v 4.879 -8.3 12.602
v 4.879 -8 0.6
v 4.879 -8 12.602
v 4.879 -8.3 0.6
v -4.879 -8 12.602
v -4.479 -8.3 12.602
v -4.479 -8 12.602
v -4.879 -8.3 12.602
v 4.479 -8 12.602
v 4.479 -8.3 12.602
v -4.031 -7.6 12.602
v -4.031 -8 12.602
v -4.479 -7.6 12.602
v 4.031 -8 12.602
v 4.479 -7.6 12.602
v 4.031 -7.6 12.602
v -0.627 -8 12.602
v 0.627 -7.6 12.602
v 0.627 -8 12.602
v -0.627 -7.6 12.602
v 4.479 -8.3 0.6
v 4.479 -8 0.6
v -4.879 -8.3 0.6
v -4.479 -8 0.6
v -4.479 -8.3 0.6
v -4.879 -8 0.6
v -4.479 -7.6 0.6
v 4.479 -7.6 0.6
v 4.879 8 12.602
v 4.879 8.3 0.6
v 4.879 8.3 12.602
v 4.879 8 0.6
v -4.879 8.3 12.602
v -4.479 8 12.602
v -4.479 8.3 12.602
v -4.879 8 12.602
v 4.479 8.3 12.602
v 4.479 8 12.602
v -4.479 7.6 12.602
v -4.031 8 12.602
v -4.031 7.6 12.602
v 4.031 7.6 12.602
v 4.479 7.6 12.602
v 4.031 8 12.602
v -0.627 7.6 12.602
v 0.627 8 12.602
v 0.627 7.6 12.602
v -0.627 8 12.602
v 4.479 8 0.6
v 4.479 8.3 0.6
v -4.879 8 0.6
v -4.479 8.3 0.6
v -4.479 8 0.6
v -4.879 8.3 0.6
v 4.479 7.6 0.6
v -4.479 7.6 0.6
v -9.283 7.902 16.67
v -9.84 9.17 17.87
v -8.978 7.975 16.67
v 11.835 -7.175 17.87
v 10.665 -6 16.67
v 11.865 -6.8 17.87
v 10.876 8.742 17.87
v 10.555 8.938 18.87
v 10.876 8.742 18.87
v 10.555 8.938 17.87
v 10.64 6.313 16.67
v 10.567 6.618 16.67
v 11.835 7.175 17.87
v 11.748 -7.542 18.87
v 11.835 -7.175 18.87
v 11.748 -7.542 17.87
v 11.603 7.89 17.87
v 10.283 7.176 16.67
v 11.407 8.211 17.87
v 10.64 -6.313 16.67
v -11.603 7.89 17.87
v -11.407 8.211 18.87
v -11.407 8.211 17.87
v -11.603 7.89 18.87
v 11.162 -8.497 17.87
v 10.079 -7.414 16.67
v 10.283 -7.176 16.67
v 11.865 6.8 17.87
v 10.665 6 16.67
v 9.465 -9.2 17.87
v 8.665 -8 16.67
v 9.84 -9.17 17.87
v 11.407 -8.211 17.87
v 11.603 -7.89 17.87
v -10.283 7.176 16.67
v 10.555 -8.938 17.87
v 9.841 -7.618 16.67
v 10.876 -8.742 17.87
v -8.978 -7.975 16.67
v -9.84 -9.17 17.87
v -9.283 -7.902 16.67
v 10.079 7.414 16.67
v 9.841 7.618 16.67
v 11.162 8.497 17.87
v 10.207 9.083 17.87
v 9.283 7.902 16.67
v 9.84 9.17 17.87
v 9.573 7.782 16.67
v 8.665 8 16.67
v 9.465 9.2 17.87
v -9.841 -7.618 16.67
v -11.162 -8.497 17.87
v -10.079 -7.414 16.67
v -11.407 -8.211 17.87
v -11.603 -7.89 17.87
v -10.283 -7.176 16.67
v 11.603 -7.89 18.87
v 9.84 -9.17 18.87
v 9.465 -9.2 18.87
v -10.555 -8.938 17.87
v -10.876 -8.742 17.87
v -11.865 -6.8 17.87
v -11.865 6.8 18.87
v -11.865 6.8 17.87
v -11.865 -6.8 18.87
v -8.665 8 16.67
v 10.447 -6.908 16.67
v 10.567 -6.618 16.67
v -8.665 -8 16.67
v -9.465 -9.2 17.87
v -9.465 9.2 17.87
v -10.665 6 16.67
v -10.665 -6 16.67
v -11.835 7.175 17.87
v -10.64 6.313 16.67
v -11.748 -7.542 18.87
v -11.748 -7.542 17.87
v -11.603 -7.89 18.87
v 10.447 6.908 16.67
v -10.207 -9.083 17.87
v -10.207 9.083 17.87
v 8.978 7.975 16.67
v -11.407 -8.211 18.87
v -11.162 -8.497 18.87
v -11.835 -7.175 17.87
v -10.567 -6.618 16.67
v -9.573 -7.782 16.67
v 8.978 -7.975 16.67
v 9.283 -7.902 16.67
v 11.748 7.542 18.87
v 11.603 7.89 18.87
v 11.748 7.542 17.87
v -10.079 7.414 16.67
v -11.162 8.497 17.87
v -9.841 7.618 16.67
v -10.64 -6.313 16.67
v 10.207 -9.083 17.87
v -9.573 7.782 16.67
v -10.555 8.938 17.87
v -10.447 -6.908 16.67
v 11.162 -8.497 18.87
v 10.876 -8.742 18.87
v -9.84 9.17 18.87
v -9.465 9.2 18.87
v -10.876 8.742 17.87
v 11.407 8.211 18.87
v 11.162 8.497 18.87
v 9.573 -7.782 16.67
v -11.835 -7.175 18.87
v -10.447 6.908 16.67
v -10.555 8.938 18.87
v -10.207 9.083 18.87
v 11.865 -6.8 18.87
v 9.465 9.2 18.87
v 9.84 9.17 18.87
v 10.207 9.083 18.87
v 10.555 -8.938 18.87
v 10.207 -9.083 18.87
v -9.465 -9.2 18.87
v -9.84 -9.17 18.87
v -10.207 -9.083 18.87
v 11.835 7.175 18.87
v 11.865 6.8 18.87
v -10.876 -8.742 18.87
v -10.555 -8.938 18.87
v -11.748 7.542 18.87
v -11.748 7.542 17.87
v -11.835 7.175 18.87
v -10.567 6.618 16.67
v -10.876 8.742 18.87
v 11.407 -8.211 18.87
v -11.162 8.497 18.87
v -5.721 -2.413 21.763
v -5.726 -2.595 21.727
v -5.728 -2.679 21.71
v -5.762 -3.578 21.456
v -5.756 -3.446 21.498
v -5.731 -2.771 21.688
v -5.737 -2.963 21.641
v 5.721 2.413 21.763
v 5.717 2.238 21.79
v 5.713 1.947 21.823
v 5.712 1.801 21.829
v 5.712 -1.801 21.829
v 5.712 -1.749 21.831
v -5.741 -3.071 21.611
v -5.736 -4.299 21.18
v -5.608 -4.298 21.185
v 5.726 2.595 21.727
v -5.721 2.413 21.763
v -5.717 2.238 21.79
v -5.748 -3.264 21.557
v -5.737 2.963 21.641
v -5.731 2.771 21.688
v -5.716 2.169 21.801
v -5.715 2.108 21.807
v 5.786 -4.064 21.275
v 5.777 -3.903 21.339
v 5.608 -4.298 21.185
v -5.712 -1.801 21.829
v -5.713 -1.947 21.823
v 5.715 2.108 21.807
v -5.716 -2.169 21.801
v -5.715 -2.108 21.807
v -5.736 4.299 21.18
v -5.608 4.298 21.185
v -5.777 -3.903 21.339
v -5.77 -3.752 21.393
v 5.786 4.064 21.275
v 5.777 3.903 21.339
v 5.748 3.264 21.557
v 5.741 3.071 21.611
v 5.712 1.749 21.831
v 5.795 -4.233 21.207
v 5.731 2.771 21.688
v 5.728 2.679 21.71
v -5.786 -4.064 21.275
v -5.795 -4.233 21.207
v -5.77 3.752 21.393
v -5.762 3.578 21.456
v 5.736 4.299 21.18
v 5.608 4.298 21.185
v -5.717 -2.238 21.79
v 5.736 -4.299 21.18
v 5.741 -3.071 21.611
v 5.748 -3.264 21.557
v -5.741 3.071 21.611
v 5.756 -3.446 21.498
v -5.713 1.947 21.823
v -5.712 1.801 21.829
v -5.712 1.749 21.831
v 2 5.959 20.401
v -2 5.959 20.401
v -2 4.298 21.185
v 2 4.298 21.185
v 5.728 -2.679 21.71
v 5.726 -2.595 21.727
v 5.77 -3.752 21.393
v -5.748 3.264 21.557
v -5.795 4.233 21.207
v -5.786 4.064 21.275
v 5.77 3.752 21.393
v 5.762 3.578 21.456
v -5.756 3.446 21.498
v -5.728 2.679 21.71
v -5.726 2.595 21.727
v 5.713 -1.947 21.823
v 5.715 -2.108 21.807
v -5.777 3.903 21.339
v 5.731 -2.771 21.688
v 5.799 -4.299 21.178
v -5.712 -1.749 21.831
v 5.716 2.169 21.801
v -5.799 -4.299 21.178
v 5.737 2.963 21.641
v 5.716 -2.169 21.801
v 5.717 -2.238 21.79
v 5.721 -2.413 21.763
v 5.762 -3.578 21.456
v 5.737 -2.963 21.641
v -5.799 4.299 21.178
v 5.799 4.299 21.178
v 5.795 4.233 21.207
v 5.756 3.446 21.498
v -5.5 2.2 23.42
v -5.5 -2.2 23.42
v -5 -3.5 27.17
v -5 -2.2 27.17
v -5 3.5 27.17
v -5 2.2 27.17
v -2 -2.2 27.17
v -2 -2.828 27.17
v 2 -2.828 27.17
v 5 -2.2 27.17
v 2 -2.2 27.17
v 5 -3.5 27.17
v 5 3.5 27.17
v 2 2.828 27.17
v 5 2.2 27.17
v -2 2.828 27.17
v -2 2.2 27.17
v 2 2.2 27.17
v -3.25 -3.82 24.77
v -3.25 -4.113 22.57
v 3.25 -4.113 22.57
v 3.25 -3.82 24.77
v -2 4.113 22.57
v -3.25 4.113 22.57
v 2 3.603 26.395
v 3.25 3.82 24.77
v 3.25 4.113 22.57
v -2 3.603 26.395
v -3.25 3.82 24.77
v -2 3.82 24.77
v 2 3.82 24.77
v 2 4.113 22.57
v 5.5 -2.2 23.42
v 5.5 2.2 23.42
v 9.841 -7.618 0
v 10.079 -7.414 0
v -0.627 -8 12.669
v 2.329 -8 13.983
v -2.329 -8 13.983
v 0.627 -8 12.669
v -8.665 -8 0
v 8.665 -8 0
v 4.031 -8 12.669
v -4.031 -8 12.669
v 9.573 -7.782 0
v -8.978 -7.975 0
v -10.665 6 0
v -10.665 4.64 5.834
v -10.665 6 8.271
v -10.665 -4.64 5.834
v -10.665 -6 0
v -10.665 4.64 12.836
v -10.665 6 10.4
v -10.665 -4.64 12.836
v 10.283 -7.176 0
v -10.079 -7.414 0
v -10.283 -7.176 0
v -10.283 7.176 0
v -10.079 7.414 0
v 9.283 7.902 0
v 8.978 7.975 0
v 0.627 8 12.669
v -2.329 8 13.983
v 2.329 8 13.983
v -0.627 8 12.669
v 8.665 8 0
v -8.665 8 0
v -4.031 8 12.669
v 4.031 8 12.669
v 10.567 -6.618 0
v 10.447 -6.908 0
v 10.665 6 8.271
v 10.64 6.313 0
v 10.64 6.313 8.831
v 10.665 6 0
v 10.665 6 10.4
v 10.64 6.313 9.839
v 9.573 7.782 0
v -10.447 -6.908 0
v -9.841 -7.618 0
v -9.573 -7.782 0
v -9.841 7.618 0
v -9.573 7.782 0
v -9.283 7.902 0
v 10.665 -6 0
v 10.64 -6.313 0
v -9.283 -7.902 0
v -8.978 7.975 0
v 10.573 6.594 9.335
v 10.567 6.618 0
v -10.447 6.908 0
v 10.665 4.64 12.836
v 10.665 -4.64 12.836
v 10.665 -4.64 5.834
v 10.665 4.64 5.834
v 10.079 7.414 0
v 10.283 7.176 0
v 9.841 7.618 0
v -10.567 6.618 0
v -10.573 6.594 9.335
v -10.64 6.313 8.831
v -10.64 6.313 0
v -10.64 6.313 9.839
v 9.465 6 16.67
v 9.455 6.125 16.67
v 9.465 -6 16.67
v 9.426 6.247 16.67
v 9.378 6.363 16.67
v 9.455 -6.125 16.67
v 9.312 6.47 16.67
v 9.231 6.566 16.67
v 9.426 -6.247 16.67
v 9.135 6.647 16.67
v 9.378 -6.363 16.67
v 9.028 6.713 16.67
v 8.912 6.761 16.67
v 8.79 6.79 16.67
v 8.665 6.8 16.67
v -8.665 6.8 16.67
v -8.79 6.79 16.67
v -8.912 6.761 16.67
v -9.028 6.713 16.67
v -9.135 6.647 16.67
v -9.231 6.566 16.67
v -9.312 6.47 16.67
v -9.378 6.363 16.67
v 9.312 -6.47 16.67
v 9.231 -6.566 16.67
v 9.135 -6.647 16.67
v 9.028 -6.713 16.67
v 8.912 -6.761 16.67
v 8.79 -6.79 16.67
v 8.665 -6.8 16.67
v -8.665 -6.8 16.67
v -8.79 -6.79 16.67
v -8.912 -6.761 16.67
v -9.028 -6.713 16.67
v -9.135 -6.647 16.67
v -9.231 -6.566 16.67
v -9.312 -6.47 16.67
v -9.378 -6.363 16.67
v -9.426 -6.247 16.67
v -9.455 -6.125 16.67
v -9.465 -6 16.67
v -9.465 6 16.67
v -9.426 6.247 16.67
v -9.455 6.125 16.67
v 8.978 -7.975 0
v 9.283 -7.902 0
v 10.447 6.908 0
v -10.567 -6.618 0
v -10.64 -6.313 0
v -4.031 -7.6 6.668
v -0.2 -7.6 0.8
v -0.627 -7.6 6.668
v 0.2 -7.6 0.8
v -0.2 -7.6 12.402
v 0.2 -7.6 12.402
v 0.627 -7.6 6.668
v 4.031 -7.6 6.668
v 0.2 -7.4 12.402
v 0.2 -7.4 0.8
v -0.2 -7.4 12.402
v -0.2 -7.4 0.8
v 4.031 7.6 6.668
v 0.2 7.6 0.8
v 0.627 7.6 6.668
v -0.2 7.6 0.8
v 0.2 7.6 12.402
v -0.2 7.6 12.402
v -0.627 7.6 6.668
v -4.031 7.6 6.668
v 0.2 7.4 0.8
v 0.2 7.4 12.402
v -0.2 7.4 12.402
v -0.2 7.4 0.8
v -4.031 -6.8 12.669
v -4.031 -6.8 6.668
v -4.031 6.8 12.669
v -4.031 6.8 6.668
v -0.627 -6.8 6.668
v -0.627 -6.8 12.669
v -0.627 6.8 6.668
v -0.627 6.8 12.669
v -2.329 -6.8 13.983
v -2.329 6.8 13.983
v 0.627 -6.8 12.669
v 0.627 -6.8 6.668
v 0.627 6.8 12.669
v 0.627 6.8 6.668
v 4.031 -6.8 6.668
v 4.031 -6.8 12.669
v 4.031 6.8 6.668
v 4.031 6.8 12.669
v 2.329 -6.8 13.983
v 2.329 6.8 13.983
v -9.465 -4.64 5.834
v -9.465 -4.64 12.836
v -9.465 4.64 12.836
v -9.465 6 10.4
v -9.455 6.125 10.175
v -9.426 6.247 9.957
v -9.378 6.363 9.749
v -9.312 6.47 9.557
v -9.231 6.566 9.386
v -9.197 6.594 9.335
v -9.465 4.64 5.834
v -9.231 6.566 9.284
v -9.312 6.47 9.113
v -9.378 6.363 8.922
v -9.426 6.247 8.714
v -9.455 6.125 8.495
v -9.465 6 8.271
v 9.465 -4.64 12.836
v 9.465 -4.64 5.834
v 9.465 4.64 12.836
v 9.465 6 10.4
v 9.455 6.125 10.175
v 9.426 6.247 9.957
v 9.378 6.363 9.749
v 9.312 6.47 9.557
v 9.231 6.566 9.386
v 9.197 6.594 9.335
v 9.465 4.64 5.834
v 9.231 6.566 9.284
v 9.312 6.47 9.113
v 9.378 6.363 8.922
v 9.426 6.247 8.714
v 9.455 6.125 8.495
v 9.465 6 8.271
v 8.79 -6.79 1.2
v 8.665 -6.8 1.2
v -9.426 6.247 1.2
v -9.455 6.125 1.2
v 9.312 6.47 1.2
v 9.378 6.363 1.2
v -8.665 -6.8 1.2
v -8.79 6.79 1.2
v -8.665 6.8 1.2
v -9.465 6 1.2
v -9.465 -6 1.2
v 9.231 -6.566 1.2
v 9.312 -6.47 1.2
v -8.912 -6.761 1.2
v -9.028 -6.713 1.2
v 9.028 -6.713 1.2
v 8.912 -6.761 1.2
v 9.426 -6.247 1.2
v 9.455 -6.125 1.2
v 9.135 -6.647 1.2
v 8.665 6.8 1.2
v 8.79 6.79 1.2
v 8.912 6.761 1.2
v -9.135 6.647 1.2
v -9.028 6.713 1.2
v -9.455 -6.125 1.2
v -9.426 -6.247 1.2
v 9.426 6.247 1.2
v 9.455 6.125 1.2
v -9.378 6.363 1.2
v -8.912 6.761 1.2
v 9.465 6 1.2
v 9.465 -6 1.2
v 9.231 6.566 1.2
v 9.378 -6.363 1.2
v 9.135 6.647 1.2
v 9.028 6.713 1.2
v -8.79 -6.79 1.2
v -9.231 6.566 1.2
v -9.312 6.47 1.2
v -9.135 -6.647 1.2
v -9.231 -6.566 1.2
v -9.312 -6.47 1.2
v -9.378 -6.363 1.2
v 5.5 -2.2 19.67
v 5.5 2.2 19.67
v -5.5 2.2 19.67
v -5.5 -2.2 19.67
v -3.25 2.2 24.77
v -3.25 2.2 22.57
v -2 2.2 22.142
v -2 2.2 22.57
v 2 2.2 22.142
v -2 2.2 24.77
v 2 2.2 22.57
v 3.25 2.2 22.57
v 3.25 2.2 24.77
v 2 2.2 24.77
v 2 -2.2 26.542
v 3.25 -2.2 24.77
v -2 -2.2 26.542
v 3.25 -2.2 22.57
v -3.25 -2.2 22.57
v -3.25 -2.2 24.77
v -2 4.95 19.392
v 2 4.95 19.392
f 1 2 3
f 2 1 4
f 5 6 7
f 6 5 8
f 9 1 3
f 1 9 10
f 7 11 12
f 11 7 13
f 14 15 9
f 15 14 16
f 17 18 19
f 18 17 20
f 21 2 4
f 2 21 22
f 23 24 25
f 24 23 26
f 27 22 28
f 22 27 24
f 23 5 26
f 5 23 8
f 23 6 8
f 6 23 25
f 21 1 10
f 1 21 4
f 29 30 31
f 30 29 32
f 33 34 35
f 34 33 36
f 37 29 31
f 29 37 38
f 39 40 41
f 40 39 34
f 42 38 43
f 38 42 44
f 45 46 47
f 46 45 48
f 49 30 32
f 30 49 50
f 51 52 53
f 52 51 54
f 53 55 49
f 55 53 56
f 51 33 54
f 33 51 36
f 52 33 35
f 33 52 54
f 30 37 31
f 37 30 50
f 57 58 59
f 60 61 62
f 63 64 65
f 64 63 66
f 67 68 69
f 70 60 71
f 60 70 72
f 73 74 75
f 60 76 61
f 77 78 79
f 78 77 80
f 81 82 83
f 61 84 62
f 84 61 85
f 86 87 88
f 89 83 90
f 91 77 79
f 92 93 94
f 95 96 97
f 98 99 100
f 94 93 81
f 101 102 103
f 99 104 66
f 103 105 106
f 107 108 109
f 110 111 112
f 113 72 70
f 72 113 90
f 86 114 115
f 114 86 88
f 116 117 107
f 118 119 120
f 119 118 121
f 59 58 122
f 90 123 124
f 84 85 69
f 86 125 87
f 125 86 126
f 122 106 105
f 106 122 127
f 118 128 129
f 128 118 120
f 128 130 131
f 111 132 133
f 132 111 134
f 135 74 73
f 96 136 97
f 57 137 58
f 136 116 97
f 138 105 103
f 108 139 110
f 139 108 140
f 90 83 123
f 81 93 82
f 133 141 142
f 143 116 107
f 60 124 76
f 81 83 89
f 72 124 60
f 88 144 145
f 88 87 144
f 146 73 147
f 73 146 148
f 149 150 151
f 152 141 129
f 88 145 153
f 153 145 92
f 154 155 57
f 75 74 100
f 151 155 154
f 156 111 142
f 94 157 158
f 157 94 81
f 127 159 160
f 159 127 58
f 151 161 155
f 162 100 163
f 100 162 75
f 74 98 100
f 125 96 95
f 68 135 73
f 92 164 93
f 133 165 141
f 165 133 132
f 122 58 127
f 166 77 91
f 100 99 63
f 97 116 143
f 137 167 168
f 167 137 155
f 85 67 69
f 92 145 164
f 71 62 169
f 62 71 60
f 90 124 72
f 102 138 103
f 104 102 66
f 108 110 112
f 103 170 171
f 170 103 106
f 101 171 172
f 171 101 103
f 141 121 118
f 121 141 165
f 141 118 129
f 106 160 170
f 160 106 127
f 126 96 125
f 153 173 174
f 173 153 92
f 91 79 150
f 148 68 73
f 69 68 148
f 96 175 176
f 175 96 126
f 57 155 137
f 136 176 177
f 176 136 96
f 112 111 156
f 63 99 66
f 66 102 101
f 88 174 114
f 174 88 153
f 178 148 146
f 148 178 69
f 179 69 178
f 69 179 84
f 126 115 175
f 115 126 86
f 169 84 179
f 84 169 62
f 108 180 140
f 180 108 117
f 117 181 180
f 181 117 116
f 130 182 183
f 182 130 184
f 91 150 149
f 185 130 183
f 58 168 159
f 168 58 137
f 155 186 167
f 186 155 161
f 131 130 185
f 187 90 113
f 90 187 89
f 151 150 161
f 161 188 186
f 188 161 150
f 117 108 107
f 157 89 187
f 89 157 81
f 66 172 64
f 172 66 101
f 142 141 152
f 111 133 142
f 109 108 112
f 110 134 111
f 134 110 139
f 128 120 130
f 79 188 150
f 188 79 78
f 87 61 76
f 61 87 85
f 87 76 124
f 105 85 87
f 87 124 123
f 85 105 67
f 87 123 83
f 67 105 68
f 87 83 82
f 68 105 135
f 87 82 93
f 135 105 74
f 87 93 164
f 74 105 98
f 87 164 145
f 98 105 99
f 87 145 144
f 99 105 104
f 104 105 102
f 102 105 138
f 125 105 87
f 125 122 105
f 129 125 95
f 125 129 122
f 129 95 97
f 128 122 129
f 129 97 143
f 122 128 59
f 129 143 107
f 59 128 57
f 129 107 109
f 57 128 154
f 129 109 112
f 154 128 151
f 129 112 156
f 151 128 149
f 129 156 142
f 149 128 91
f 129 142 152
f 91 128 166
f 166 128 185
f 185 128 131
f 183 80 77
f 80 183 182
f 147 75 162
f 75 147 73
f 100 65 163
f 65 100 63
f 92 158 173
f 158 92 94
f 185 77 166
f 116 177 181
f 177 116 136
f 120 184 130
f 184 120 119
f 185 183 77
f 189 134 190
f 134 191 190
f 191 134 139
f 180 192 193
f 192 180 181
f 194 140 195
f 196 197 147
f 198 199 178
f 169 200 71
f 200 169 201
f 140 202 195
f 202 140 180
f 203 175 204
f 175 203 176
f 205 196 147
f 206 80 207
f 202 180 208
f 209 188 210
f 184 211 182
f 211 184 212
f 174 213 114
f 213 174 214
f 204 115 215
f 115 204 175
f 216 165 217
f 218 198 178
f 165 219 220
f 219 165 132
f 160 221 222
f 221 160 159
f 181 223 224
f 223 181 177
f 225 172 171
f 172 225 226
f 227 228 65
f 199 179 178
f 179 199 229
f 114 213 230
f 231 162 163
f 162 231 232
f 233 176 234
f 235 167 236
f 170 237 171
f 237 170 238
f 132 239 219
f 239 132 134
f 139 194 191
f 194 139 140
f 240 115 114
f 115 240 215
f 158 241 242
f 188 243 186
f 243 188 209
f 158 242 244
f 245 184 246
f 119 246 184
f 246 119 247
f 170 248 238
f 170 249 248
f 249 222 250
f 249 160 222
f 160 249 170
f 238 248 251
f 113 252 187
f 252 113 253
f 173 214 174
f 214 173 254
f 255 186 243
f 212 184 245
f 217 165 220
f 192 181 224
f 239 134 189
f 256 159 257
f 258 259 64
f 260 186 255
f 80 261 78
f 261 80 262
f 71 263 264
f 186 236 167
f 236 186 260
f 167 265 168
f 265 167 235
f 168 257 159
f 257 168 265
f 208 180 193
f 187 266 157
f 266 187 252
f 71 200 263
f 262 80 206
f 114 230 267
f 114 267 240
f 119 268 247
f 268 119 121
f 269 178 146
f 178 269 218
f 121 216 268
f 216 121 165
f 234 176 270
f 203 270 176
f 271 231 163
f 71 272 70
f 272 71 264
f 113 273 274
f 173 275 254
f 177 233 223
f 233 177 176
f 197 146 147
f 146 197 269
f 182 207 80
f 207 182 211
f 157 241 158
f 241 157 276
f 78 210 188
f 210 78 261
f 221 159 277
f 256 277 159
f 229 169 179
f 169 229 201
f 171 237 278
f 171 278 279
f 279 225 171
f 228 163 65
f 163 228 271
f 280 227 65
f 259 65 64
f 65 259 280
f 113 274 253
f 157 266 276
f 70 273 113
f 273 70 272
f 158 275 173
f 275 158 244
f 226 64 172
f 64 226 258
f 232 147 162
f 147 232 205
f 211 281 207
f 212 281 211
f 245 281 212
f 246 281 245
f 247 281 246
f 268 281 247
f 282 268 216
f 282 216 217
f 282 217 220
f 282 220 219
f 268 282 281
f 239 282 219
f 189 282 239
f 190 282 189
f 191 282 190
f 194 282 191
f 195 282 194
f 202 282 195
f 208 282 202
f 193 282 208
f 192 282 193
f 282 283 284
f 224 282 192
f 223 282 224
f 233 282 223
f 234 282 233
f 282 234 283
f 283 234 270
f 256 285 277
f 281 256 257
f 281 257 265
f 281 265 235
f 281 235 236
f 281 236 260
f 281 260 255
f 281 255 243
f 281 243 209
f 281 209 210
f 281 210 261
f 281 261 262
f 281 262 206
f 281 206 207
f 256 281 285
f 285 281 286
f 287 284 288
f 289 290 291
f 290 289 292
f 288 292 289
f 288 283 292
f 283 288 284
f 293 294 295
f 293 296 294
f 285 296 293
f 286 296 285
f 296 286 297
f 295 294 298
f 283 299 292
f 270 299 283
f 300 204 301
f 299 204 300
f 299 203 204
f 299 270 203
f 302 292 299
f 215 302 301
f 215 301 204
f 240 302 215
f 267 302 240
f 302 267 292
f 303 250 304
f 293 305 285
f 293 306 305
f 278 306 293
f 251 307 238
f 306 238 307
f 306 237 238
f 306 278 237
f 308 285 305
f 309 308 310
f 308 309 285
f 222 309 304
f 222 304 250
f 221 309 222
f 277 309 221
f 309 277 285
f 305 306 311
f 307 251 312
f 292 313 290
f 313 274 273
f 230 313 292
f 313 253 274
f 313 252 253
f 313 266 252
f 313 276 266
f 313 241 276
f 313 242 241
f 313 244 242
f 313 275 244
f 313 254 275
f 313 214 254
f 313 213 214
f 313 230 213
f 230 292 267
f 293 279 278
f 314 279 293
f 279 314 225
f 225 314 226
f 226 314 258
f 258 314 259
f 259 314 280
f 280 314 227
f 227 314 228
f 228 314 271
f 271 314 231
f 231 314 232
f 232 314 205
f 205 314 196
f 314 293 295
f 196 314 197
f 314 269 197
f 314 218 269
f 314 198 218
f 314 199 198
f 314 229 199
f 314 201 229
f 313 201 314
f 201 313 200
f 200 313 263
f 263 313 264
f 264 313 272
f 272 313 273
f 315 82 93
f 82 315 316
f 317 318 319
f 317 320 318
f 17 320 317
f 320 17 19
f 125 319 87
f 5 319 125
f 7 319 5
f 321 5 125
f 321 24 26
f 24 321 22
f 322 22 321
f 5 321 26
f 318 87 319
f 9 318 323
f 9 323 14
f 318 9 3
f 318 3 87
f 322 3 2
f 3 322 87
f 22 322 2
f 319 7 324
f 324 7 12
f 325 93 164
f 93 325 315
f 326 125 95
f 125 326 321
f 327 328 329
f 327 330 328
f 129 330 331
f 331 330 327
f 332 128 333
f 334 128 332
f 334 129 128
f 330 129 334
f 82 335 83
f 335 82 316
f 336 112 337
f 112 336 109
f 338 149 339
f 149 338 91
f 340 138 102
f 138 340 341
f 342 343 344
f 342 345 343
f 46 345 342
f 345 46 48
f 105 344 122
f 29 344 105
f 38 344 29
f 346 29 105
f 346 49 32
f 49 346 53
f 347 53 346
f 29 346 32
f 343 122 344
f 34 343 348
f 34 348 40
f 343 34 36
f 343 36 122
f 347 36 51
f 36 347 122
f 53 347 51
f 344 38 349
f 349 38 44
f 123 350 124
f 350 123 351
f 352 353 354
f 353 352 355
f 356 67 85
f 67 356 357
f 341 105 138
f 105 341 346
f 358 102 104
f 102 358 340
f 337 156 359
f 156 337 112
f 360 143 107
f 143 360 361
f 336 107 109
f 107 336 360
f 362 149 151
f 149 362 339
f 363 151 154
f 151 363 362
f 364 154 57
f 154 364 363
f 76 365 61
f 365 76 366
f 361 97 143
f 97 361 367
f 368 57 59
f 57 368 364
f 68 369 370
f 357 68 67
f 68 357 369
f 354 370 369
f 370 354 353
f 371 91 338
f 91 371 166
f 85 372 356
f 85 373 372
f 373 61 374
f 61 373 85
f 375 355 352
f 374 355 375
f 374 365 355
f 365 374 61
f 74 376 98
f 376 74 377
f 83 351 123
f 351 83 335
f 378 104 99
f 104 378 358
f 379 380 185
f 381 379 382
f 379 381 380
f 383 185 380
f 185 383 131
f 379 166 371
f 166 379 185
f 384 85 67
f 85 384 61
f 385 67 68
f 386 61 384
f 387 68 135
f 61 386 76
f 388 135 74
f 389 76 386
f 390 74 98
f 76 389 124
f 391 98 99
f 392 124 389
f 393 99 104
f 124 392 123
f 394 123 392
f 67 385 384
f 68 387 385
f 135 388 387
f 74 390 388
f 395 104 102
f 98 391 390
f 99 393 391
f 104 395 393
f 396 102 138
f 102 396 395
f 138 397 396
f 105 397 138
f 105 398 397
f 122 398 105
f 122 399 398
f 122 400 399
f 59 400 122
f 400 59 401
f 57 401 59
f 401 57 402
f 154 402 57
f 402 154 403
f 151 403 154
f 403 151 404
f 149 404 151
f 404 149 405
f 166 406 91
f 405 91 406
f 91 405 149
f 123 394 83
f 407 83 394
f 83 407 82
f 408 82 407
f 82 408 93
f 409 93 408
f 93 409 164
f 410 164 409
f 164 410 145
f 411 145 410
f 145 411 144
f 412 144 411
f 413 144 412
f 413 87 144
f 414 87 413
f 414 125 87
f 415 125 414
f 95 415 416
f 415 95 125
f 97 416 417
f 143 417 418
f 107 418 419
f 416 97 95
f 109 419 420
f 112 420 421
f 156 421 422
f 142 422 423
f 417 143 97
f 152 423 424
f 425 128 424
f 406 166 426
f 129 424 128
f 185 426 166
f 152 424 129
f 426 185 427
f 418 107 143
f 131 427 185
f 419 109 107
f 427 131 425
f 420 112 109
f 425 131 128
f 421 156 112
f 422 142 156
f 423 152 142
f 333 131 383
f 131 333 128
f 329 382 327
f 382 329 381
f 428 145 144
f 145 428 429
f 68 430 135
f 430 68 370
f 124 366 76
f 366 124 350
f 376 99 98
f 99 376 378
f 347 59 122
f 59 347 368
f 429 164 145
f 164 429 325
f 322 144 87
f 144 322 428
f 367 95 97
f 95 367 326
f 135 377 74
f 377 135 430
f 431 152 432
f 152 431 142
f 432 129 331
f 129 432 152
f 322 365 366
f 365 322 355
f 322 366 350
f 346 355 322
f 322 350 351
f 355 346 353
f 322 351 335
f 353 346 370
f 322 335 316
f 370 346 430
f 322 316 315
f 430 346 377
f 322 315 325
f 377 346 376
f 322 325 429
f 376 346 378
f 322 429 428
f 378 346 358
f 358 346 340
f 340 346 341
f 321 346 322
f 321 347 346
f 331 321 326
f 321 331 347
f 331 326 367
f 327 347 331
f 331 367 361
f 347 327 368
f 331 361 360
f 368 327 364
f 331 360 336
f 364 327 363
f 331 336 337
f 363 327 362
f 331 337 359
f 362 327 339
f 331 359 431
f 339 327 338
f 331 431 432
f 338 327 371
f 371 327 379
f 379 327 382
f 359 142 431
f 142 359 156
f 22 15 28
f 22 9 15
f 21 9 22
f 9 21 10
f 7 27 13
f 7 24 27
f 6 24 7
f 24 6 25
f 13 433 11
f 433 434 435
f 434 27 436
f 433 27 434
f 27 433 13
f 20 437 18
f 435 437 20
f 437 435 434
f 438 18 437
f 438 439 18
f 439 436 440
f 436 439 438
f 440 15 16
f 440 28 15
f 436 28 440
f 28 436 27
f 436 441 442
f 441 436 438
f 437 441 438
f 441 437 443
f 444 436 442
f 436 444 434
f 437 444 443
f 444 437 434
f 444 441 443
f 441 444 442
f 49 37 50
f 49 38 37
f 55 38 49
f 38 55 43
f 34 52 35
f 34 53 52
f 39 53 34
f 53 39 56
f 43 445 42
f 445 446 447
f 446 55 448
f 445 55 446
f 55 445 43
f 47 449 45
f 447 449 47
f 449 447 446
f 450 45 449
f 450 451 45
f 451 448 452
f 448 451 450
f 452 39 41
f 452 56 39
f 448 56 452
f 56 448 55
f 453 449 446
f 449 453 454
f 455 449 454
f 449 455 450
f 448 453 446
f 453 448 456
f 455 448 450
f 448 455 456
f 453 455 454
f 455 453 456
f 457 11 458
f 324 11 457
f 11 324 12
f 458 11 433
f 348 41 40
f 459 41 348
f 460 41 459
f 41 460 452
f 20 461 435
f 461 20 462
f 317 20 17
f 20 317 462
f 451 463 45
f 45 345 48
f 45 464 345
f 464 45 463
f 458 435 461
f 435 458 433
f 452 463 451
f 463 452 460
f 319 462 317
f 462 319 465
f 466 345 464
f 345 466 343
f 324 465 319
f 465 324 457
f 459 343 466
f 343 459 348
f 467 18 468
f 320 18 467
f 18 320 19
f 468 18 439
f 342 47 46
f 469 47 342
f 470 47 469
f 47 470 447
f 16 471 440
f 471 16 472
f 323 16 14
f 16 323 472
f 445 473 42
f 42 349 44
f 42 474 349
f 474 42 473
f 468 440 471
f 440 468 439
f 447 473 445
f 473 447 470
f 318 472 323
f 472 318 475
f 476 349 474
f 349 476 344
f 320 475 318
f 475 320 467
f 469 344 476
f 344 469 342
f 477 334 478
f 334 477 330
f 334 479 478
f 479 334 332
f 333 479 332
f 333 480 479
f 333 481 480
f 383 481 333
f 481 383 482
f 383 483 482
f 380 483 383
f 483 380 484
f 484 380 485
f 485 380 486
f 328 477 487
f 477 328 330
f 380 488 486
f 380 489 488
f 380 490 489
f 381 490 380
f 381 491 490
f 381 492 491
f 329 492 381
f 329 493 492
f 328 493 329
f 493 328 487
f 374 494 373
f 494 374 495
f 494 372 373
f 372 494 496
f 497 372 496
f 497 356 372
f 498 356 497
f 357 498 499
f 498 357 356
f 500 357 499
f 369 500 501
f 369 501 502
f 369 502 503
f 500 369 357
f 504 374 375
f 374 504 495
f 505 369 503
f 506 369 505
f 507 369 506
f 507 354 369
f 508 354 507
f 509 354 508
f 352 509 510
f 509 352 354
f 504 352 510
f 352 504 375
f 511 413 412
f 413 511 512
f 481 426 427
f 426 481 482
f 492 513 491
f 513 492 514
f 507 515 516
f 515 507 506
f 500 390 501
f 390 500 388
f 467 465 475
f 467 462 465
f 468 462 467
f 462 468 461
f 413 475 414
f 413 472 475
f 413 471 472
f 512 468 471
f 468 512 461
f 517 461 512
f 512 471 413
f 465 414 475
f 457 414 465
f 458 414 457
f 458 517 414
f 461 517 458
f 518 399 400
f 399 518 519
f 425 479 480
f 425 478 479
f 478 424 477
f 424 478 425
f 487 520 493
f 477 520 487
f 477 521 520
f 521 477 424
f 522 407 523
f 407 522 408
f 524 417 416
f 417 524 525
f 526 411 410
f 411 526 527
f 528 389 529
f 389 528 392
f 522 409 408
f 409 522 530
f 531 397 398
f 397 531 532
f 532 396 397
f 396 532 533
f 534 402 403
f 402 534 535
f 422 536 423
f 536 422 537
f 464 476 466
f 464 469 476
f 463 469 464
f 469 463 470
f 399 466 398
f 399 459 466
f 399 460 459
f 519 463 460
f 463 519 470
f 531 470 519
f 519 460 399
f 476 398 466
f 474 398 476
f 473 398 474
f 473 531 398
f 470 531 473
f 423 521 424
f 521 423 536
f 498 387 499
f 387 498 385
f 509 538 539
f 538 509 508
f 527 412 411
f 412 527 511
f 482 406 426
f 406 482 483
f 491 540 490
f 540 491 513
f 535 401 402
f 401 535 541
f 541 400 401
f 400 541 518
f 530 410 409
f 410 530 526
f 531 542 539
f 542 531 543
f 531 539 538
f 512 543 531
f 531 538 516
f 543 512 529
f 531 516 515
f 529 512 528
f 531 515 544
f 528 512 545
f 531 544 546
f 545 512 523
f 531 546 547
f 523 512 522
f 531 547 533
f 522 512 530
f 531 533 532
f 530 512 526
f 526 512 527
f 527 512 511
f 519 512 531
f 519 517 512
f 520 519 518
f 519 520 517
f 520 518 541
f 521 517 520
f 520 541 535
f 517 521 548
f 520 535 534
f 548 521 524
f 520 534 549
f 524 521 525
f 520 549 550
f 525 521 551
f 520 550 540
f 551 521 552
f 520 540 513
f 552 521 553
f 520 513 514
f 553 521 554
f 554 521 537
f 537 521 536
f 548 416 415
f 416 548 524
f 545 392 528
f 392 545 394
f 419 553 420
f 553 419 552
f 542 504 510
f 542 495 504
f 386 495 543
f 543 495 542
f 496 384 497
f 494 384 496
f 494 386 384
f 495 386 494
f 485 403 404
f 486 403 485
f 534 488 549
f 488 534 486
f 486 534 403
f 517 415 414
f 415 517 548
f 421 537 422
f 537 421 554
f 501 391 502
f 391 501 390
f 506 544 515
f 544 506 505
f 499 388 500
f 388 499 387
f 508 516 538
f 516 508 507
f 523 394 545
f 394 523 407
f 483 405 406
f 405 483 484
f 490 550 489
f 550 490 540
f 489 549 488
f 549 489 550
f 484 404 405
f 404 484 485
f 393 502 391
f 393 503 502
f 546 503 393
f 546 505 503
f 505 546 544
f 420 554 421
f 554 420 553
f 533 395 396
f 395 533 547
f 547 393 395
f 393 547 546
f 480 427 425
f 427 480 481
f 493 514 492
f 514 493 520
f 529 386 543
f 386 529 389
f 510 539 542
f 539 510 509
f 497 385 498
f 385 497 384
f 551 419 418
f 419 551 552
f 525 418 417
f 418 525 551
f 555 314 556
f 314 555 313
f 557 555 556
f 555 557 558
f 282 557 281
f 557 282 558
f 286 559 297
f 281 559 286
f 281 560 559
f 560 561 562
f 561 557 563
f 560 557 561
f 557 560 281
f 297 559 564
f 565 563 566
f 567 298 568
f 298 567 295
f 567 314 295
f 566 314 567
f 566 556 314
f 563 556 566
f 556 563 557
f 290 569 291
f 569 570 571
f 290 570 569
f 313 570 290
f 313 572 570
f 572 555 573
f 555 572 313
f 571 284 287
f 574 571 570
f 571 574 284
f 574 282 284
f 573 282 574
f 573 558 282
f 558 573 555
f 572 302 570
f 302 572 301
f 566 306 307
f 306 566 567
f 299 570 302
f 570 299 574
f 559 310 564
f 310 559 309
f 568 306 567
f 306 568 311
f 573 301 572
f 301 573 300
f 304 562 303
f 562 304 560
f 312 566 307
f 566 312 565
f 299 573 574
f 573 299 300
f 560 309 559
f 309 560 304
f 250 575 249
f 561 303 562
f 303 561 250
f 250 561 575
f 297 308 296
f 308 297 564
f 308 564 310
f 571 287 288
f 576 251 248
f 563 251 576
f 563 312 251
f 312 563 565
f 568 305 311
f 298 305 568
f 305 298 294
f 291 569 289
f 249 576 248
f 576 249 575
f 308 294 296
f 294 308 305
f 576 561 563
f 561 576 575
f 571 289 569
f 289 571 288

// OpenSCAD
// ====================================================================
// 1-Piece Unified Gondola Cabin Body & Roof (100% Blind Snap-Fit)
//
// Print Orientation:
// - Roof is fused directly onto the top of the cabin body as a single object.
// - Sits 100% flat on build plate at Z = 0 (cabin floor).
// - Roof overhang uses a 45-degree self-supporting chamfer profile = ZERO SUPPORTS NEEDED!
// - Roof clevis features 100% blind inner snap-detent sockets (ZERO exterior through-holes!).
// ====================================================================

$fn = 40;

// Dimensions (mm)
cabin_w       = 16.0;  // Width
cabin_l       = 21.33; // Length
cabin_h       = 16.67; // Body height
wall_th       = 1.2;   // Wall thickness
corner_r      = 2.0;   // Rounded corner radius

hanger_height = 24.0;
hanger_offset = 10.0;
hanger_th     = 4.0;
snap_stud_d   = 3.4;

module rounded_box(l, w, h, r) {
    hull() {
        for (x = [-l/2 + r, l/2 - r]) {
            for (y = [-w/2 + r, w/2 - r]) {
                translate([x, y, 0])
                    cylinder(r = r, h = h);
            }
        }
    }
}

module gondola_cabin_single_piece() {
    door_w = cabin_l * 0.42;
    door_h = cabin_h * 0.72;
    door_z = 0.6 + door_h / 2;
    
    roof_lip = 1.2;
    roof_h   = 5.0;
    clevis_slot_w = 4.4;
    clevis_h      = 5.0;

    difference() {
        union() {
            // Main Cabin Body
            rounded_box(cabin_l, cabin_w, cabin_h, corner_r);
            
            // Outer door frame molding / trim on sides (+Y and -Y)
            for (y_sign = [-1, 1]) {
                translate([0, y_sign * (cabin_w / 2 + 0.1), door_z])
                    cube([door_w + 0.8, 0.4, door_h], center = true);
            }
            
            // Integrated 1-Piece Roof
            translate([0, 0, cabin_h]) {
                hull() {
                    translate([0, 0, 0])
                        rounded_box(cabin_l, cabin_w, 0.1, corner_r);
                    translate([0, 0, roof_lip])
                        rounded_box(cabin_l + roof_lip*2, cabin_w + roof_lip*2, 0.1, corner_r + 0.4);
                }
                
                hull() {
                    translate([0, 0, roof_lip])
                        rounded_box(cabin_l + roof_lip*2, cabin_w + roof_lip*2, 1.0, corner_r + 0.4);
                    translate([0, 0, roof_h])
                        rounded_box(cabin_l * 0.45, cabin_w * 0.25, 0.6, 1.0);
                }
                
                // Solid Roof Clevis Bracket (ZERO exterior through-holes!)
                translate([0, 0, roof_h / 2])
                    hull() {
                        cube([12.0, 9.0, 1.0], center = true);
                        translate([0, 0, roof_h / 2 + clevis_h / 2])
                            cube([10.0, 7.0, clevis_h + 1], center = true);
                    }
            }
        }

        // Hollow interior cavity
        translate([0, 0, wall_th])
            rounded_box(cabin_l - wall_th*2, cabin_w - wall_th*2, cabin_h - wall_th, max(0.8, corner_r - wall_th));

        // Doors
        for (y_sign = [-1, 1]) {
            translate([0, y_sign * (cabin_w / 2), door_z])
                cube([door_w, 0.8, door_h], center = true);
            translate([0, y_sign * (cabin_w / 2), door_z])
                cube([0.4, 1.2, door_h - 0.4], center = true);
            translate([1.2, y_sign * (cabin_w / 2 + 0.15), door_z])
                rotate([90, 0, 0]) cylinder(d = 1.0, h = 1.0, center = true);
            translate([-1.2, y_sign * (cabin_w / 2 + 0.15), door_z])
                rotate([90, 0, 0]) cylinder(d = 1.0, h = 1.0, center = true);
        }

        // Windows
        for (x = [-door_w * 0.26, door_w * 0.26]) {
            translate([x, 0, cabin_h * 0.58])
                rotate([90, 0, 0])
                    hull() {
                        cube([door_w * 0.38, cabin_h * 0.36, cabin_w + 10], center = true);
                        translate([0, cabin_h * 0.16, 0])
                            rotate([0, 0, 45])
                                cube([door_w * 0.26, door_w * 0.26, cabin_w + 10], center = true);
                    }
        }
        
        for (x = [-cabin_l/2 - 2, cabin_l/2 + 2]) {
            translate([x, 0, cabin_h * 0.56])
                rotate([0, 90, 0])
                    hull() {
                        cube([cabin_h * 0.42, cabin_w * 0.58, 20], center = true);
                        translate([0, cabin_w * 0.20, 0])
                            rotate([0, 0, 45])
                                cube([cabin_w * 0.3, cabin_w * 0.3, 20], center = true);
                    }
        }

        // --- INTERNAL BARB-LOCK SHOULDER SOCKET (RECEIVES HANGER ARM BARB) ---
        // 1. Central receiving slot for 4.0mm C-Hanger Arm bottom tab
        translate([0, 0, cabin_h + roof_h + clevis_h / 2 + 0.5])
            cube([11.0, clevis_slot_w, clevis_h + 5], center = true);

        // 2. Internal Barb-Lock Shoulders (6.5mm width inside slot for 6.2mm barb snap)
        translate([0, 0, cabin_h + roof_h + 2.0])
            cube([6.5, clevis_slot_w + 4.0, 2.2], center = true);

        // 3. 45-degree self-guiding lead-in mouth at entry
        translate([0, 0, cabin_h + roof_h + clevis_h + 0.5])
            rotate([45, 0, 0])
                cube([4.0, 4.0, 18.0], center = true);
    }
}

// Render flat on bed at Z = 0
gondola_cabin_single_piece();
